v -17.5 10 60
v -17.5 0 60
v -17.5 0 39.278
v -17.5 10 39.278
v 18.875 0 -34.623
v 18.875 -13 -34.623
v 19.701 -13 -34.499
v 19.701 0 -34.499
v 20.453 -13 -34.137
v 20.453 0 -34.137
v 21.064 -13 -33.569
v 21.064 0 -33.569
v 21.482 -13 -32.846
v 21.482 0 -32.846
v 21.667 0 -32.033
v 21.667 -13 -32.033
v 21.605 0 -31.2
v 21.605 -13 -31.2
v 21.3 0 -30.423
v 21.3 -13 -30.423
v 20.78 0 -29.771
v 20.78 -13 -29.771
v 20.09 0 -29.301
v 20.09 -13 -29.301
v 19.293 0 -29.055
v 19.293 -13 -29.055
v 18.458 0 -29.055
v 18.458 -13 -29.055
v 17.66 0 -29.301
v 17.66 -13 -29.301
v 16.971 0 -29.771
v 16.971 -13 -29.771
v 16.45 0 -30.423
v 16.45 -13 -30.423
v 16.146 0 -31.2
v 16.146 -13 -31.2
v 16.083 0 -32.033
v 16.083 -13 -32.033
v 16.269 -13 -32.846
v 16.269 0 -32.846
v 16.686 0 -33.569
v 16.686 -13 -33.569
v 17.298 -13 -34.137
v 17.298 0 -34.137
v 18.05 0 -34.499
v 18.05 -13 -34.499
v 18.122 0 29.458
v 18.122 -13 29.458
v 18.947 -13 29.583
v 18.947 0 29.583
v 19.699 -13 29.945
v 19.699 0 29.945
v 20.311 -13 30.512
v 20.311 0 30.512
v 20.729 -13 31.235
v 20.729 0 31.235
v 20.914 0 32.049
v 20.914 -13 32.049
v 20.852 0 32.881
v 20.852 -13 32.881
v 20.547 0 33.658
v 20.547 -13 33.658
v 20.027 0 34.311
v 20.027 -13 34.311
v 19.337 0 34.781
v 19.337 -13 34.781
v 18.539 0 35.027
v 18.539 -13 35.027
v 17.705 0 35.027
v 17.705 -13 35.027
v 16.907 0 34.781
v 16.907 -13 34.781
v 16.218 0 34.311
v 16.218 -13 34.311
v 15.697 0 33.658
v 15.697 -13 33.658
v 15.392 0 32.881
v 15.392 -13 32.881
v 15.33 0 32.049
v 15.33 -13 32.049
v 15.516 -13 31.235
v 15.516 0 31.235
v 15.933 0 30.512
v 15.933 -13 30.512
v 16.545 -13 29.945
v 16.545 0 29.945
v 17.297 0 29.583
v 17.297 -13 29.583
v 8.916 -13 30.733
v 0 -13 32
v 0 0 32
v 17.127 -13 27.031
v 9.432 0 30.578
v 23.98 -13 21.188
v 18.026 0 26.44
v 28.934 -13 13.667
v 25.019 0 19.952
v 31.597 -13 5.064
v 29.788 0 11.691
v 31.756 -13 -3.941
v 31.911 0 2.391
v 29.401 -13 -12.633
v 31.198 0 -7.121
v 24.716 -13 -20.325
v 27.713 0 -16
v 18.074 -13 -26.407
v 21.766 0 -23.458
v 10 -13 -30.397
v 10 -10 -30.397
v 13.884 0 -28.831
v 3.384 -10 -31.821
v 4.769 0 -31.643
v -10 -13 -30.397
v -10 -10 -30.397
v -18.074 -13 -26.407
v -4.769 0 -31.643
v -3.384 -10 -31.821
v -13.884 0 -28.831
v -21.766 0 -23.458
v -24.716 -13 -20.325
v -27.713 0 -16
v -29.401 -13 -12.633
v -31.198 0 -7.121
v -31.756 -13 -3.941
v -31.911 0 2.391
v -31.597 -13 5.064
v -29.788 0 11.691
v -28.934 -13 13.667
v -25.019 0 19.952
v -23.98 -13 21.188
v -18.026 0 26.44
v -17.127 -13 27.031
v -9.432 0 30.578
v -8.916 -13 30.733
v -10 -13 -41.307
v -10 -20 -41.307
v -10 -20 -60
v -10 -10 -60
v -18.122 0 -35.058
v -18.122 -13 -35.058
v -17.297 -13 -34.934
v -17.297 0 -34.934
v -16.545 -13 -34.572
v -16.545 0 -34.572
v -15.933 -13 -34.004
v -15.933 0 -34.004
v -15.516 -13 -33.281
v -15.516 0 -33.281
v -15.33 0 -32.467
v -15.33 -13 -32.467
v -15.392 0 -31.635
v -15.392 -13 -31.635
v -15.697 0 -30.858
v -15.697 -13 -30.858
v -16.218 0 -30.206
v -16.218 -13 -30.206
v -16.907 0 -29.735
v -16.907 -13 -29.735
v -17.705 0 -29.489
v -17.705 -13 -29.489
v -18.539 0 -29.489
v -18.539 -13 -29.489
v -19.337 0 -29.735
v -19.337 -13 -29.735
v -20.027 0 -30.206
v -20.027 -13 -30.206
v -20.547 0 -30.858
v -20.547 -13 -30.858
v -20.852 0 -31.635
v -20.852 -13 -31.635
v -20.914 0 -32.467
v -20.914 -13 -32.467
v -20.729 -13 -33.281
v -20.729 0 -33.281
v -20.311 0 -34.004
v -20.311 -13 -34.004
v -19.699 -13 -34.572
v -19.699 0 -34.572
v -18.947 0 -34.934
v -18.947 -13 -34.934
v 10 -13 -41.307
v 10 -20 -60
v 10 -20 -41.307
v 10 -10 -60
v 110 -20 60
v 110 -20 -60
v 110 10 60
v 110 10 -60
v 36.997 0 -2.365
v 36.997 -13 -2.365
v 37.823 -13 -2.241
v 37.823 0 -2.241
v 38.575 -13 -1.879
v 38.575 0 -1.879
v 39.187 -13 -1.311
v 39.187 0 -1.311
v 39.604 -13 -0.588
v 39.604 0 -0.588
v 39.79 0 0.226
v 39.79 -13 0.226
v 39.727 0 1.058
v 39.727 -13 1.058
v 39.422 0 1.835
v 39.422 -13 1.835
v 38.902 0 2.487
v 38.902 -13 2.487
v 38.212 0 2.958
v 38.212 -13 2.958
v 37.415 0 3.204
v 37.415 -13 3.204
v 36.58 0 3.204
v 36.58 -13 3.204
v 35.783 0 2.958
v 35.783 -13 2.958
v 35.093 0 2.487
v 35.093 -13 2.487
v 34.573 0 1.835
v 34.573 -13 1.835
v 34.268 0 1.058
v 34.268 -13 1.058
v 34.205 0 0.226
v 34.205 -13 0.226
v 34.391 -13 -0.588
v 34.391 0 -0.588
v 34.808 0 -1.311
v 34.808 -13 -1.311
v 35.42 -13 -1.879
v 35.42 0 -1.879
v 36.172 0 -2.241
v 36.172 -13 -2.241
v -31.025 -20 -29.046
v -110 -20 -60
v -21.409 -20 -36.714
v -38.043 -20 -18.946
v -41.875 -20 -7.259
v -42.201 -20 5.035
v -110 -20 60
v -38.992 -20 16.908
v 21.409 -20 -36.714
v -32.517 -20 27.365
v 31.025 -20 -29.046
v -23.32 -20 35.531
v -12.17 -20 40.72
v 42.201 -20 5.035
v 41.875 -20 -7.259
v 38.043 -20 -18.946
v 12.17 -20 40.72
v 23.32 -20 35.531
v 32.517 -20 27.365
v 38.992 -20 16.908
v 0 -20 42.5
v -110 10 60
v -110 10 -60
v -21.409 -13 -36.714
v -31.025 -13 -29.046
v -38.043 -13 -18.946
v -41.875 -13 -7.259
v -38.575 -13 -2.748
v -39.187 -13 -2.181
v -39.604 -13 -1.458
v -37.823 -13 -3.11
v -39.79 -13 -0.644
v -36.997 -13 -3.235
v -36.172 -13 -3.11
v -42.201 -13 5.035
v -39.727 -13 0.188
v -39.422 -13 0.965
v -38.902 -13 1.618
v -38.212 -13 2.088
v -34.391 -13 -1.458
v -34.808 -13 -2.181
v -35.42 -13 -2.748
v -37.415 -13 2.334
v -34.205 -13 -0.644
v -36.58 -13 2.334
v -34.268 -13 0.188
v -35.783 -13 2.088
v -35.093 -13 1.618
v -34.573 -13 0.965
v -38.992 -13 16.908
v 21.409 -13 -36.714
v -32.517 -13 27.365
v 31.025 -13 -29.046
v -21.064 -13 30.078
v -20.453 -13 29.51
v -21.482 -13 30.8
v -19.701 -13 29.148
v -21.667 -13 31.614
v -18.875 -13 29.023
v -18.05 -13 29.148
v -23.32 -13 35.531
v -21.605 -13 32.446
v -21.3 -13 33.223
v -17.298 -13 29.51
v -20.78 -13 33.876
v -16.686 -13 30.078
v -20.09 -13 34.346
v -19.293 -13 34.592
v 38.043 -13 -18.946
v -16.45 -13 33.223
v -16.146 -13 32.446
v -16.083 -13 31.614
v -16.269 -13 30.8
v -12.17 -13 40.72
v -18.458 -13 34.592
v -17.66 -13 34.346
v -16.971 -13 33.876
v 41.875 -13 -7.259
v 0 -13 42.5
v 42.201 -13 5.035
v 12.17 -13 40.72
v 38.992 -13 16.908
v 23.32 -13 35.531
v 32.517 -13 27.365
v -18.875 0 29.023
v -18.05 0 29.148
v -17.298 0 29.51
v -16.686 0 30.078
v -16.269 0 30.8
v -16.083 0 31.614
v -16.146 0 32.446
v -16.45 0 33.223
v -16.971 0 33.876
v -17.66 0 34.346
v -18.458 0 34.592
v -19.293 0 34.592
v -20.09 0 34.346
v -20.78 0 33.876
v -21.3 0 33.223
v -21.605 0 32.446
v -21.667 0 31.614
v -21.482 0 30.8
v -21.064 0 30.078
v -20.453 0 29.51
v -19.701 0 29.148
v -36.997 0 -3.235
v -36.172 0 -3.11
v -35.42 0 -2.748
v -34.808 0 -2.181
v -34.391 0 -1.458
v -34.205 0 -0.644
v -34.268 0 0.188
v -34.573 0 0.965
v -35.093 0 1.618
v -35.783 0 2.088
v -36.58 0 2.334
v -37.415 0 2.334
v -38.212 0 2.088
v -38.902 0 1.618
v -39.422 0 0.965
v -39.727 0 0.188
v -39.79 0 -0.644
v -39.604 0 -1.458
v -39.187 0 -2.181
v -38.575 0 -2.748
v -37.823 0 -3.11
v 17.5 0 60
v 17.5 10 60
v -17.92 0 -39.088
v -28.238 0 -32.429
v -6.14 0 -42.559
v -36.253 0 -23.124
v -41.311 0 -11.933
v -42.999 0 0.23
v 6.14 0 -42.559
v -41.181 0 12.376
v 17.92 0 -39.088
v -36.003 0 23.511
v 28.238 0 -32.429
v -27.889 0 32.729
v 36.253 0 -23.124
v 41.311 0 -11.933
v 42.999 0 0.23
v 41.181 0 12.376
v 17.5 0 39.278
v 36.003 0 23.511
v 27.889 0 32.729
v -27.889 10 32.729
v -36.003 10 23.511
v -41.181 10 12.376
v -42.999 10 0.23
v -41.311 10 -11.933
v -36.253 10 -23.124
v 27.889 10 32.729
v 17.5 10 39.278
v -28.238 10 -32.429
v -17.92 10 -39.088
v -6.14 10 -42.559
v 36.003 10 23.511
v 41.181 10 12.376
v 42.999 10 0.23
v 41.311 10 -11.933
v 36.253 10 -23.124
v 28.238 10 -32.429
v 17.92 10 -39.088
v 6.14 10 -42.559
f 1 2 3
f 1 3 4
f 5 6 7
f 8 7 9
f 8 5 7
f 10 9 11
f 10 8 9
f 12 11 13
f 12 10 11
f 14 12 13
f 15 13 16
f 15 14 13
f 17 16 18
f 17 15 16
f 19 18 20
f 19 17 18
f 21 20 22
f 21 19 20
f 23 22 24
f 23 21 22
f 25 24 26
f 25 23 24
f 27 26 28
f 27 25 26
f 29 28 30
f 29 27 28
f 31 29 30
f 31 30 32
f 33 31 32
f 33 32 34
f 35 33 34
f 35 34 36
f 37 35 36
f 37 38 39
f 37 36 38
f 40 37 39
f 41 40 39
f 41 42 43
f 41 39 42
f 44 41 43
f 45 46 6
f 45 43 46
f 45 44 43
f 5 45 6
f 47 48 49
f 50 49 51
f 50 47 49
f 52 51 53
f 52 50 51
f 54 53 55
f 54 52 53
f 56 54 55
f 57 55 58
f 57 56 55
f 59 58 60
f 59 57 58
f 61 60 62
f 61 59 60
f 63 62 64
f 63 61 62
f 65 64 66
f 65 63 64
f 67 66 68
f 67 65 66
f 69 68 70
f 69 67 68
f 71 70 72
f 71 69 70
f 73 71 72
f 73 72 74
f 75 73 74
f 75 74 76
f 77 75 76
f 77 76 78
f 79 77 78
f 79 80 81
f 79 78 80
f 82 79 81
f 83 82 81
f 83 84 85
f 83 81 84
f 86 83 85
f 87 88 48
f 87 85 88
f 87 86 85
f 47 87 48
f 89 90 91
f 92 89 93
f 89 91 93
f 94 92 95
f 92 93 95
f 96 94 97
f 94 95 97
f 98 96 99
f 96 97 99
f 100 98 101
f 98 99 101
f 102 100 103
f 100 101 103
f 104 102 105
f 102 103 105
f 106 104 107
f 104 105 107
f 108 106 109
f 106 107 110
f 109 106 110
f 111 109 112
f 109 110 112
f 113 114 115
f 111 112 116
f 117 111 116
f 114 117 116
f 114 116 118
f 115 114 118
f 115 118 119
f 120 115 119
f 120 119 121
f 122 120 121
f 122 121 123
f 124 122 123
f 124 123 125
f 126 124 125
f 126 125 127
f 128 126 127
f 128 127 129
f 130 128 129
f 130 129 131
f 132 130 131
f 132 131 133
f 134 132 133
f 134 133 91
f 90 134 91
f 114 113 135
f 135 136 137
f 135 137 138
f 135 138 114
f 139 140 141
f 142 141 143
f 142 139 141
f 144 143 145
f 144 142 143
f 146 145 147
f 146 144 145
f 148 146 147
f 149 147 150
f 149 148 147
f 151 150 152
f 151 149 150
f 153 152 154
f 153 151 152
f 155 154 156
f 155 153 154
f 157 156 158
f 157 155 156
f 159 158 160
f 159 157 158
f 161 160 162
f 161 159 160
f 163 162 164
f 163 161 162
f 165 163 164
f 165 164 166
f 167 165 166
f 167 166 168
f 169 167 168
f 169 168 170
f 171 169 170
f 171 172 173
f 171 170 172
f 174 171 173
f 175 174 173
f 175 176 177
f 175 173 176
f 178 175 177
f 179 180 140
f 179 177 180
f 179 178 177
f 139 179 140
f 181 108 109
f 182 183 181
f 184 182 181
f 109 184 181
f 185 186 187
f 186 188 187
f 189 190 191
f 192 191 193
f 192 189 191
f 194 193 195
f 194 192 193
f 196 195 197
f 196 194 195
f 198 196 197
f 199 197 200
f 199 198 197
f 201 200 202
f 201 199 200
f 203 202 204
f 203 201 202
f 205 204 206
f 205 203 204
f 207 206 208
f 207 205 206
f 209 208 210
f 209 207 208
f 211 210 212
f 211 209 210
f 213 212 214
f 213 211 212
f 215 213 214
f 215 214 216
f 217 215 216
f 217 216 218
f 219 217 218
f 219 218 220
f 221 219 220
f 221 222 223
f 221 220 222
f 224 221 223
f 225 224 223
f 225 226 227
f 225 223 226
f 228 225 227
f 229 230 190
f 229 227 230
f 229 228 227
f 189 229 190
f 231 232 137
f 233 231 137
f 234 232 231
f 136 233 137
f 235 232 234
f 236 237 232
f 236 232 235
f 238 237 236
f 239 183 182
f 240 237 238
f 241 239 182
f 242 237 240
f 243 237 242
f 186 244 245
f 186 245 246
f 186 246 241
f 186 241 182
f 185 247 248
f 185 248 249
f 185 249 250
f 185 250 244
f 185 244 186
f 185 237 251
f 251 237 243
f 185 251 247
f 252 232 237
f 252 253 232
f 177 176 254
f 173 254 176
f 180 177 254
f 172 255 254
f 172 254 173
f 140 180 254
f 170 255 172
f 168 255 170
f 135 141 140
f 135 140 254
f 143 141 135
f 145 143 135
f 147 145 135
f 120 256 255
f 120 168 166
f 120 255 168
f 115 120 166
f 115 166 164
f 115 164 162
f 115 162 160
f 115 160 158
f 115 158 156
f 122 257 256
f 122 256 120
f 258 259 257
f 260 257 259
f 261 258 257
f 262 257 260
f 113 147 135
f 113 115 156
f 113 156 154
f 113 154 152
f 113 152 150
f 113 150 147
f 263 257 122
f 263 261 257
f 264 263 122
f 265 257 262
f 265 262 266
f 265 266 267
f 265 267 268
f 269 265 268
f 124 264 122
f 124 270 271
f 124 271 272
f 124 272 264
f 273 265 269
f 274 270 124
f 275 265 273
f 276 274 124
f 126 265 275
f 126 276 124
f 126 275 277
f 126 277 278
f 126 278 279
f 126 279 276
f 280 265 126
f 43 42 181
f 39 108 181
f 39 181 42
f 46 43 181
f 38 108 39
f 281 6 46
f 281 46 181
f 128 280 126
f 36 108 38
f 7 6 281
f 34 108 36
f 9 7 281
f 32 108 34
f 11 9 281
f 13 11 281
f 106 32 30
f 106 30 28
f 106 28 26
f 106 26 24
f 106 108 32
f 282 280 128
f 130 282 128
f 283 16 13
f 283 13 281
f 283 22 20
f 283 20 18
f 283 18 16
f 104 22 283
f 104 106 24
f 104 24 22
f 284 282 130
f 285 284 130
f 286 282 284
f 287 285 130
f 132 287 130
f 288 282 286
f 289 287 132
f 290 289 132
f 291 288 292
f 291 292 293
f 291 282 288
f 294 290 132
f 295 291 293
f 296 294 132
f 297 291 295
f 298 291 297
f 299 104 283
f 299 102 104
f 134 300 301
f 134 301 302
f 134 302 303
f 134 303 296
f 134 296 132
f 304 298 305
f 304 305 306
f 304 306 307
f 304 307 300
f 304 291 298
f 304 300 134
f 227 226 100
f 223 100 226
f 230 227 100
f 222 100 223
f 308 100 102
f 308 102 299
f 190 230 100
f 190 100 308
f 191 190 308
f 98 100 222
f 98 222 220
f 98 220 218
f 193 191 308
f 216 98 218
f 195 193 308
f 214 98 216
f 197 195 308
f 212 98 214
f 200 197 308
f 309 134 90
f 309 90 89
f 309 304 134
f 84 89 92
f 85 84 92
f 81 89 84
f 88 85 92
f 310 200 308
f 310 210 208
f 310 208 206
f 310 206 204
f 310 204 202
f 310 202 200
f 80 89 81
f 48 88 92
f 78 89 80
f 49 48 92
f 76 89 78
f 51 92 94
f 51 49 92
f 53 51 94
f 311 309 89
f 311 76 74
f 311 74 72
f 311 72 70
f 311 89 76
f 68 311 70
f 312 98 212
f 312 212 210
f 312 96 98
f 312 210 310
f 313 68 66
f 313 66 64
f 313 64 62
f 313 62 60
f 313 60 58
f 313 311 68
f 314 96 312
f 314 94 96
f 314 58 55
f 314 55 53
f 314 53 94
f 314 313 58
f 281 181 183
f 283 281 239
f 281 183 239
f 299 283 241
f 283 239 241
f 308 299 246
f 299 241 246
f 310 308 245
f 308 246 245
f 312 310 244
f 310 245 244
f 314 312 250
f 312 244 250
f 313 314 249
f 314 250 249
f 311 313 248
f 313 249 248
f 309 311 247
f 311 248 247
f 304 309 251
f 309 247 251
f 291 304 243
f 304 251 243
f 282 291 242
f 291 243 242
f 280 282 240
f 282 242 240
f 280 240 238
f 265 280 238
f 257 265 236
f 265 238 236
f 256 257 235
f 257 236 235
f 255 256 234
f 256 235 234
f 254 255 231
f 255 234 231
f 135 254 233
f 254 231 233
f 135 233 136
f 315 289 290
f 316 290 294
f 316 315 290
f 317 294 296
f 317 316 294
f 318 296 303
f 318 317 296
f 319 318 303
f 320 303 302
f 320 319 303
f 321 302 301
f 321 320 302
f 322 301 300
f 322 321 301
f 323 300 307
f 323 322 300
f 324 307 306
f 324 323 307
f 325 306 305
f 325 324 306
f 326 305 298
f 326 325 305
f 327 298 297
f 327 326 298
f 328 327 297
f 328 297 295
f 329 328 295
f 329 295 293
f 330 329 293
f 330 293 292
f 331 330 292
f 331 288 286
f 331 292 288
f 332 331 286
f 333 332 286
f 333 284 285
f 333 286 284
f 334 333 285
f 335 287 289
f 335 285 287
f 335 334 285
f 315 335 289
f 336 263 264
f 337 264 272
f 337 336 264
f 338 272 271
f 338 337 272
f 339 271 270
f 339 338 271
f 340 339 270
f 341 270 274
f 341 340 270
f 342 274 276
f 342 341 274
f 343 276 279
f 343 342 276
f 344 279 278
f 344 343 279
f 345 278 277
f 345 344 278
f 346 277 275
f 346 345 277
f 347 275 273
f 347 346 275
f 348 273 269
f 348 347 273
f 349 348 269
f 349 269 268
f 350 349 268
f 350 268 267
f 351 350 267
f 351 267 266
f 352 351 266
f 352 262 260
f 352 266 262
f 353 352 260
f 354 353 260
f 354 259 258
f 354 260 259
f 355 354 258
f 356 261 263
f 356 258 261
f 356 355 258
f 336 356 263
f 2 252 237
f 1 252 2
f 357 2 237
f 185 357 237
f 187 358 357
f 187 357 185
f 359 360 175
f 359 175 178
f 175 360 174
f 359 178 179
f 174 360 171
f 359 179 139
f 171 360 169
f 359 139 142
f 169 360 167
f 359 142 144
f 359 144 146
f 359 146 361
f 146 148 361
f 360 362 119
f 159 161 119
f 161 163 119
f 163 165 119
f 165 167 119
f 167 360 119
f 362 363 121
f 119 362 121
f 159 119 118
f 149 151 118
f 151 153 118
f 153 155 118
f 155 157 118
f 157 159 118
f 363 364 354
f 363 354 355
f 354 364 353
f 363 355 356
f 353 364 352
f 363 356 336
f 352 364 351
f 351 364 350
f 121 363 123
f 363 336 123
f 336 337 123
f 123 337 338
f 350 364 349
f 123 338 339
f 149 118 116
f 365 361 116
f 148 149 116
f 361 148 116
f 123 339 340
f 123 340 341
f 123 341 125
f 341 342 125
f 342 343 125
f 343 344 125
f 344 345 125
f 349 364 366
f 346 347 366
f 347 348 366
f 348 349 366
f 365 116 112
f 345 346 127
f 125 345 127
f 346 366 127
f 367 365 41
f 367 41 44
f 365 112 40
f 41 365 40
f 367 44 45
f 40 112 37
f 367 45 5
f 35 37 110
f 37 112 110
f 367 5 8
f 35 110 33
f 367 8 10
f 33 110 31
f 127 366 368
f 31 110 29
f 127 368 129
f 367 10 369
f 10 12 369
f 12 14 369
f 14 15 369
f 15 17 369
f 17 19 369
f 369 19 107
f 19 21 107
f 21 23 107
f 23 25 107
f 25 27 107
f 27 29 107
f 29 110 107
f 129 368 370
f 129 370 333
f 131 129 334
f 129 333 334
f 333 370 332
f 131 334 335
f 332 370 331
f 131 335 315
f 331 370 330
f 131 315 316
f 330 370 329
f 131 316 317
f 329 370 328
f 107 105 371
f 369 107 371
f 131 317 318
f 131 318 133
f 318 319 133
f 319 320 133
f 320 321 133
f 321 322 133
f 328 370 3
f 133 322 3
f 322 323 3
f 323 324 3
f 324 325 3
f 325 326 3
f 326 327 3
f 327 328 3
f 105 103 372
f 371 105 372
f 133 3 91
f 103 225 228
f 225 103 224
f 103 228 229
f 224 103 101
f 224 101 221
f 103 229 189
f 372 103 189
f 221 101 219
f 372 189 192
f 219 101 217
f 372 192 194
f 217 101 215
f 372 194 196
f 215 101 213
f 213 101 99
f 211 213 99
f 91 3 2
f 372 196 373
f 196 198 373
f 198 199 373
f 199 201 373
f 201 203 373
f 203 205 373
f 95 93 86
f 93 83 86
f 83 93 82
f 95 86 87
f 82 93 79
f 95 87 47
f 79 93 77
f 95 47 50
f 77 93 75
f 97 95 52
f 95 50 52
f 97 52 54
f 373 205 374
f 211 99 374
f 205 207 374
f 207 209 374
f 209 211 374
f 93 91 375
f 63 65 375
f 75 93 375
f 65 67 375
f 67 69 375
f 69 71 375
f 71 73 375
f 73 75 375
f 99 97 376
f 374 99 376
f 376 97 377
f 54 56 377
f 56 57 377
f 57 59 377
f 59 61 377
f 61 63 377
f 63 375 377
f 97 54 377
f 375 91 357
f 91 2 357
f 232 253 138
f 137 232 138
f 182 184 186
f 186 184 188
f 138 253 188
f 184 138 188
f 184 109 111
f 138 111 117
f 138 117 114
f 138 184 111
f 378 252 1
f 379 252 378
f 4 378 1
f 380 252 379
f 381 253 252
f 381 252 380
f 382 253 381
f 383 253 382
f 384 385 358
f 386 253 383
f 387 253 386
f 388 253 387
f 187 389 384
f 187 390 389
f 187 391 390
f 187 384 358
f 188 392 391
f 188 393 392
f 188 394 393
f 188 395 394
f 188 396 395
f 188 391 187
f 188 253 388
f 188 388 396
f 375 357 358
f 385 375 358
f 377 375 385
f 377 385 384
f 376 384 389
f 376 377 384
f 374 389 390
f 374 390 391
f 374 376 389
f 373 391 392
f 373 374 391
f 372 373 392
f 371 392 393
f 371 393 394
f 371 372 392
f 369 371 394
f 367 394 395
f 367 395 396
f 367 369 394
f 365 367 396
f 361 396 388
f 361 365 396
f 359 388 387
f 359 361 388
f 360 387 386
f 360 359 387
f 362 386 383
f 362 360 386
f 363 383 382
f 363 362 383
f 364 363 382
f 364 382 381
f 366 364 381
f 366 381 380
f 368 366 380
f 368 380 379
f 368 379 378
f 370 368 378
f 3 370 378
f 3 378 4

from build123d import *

# Parameters (mm, degrees)
SKETCH1_W               = 220
SKETCH1_H               = 120
SKETCH1_R               = 43
BOSS_EXTRUDE1_DEPTH     = 10
SKETCH2_W               = 220
SKETCH2_H               = 120
SKETCH2_R               = 2.8
BOSS_EXTRUDE2_DEPTH     = 20
CUT_EXTRUDE1_REACH      = 166.012
CUT_EXTRUDE1_END_RADIUS = 43
SKETCH3_W               = 35
SKETCH3_H               = 10
SKETCH4_R               = 32
CUT_EXTRUDE2_DEPTH      = 127.885775404
CUT_EXTRUDE3_REACH      = 166.012
CUT_EXTRUDE3_END_RADIUS = 32
SKETCH5_W               = 20
SKETCH5_H               = 10
SKETCH6_R               = 42.5
CUT_EXTRUDE4_DEPTH      = 7


with BuildPart() as part:
    # Sketch1 → Boss-Extrude1 (new body)
    with BuildSketch(Plane(origin=(0, 0, 0), x_dir=(1, 0, 0), z_dir=(0, 1, 0))):
        Rectangle(SKETCH1_W, SKETCH1_H)
        with Locations(Location((0, 0, 0), (0, 0, 270))):
            Circle(SKETCH1_R, mode=Mode.SUBTRACT)
    extrude(amount=BOSS_EXTRUDE1_DEPTH)

    # Sketch2 → Boss-Extrude2 (add)
    with BuildSketch(Plane.XZ):
        Rectangle(SKETCH2_W, SKETCH2_H)
        with Locations(Location((18.122136771, 32.25814872, 0), (0, 0, 270))):
            Circle(SKETCH2_R, mode=Mode.SUBTRACT)
        with Locations(Location((36.997444656, 0.434843546, 0), (0, 0, 270))):
            Circle(SKETCH2_R, mode=Mode.SUBTRACT)
        with Locations(Location((18.875307886, -31.823305174, 0), (0, 0, 270))):
            Circle(SKETCH2_R, mode=Mode.SUBTRACT)
        with Locations(Location((-18.122136771, -32.25814872, 0), (0, 0, 270))):
            Circle(SKETCH2_R, mode=Mode.SUBTRACT)
        with Locations(Location((-36.997444656, -0.434843546, 0), (0, 0, 270))):
            Circle(SKETCH2_R, mode=Mode.SUBTRACT)
        with Locations(Location((-18.875307886, 31.823305174, 0), (0, 0, 270))):
            Circle(SKETCH2_R, mode=Mode.SUBTRACT)
    extrude(amount=BOSS_EXTRUDE2_DEPTH)

    # Cut-Extrude1: up to this cylinder (the profile starts outside it)
    cut_extrude1_end = Plane(origin=(0, 5, 0), z_dir=(0, -1, 0)) * Cylinder(CUT_EXTRUDE1_END_RADIUS, 419.024, mode=Mode.PRIVATE)
    # Sketch3 → Cut-Extrude1 (cut, up to the surface)
    with BuildSketch(Plane.XY.offset(60), mode=Mode.PRIVATE) as cut_extrude1_sk1:
        with Locations((0, 5)):
            Rectangle(SKETCH3_W, SKETCH3_H)
    cut_extrude1_tool1 = extrude(cut_extrude1_sk1.sketch, amount=-CUT_EXTRUDE1_REACH, mode=Mode.PRIVATE) - cut_extrude1_end
    add(cut_extrude1_tool1.solids().sort_by_distance((0, 5, 60))[0], mode=Mode.SUBTRACT)

    # Sketch4 → Cut-Extrude2 (cut, through all)
    with BuildSketch(Plane(origin=(0, 0, 0), x_dir=(1, 0, 0), z_dir=(0, 1, 0))):
        with Locations(Location((0, 0, 0), (0, 0, 270))):
            Circle(SKETCH4_R)
    extrude(amount=-CUT_EXTRUDE2_DEPTH, mode=Mode.SUBTRACT)

    # Cut-Extrude3: up to this cylinder (the profile starts outside it)
    cut_extrude3_end = Plane(origin=(0, -15, 0), z_dir=(0, 1, 0)) * Cylinder(CUT_EXTRUDE3_END_RADIUS, 397.024, mode=Mode.PRIVATE)
    # Sketch5 → Cut-Extrude3 (cut, up to the surface)
    with BuildSketch(Plane(origin=(0, 0, -60), x_dir=(-1, 0, 0), z_dir=(0, 0, -1)), mode=Mode.PRIVATE) as cut_extrude3_sk1:
        with Locations((0, -15)):
            Rectangle(SKETCH5_W, SKETCH5_H)
    cut_extrude3_tool1 = extrude(cut_extrude3_sk1.sketch, amount=-CUT_EXTRUDE3_REACH, mode=Mode.PRIVATE) - cut_extrude3_end
    add(cut_extrude3_tool1.solids().sort_by_distance((0, -15, -60))[0], mode=Mode.SUBTRACT)

    # Sketch6 → Cut-Extrude4 (cut)
    with BuildSketch(Plane.XZ.offset(20)):
        Circle(SKETCH6_R)
    extrude(amount=-CUT_EXTRUDE4_DEPTH, mode=Mode.SUBTRACT)


solid = part.part
